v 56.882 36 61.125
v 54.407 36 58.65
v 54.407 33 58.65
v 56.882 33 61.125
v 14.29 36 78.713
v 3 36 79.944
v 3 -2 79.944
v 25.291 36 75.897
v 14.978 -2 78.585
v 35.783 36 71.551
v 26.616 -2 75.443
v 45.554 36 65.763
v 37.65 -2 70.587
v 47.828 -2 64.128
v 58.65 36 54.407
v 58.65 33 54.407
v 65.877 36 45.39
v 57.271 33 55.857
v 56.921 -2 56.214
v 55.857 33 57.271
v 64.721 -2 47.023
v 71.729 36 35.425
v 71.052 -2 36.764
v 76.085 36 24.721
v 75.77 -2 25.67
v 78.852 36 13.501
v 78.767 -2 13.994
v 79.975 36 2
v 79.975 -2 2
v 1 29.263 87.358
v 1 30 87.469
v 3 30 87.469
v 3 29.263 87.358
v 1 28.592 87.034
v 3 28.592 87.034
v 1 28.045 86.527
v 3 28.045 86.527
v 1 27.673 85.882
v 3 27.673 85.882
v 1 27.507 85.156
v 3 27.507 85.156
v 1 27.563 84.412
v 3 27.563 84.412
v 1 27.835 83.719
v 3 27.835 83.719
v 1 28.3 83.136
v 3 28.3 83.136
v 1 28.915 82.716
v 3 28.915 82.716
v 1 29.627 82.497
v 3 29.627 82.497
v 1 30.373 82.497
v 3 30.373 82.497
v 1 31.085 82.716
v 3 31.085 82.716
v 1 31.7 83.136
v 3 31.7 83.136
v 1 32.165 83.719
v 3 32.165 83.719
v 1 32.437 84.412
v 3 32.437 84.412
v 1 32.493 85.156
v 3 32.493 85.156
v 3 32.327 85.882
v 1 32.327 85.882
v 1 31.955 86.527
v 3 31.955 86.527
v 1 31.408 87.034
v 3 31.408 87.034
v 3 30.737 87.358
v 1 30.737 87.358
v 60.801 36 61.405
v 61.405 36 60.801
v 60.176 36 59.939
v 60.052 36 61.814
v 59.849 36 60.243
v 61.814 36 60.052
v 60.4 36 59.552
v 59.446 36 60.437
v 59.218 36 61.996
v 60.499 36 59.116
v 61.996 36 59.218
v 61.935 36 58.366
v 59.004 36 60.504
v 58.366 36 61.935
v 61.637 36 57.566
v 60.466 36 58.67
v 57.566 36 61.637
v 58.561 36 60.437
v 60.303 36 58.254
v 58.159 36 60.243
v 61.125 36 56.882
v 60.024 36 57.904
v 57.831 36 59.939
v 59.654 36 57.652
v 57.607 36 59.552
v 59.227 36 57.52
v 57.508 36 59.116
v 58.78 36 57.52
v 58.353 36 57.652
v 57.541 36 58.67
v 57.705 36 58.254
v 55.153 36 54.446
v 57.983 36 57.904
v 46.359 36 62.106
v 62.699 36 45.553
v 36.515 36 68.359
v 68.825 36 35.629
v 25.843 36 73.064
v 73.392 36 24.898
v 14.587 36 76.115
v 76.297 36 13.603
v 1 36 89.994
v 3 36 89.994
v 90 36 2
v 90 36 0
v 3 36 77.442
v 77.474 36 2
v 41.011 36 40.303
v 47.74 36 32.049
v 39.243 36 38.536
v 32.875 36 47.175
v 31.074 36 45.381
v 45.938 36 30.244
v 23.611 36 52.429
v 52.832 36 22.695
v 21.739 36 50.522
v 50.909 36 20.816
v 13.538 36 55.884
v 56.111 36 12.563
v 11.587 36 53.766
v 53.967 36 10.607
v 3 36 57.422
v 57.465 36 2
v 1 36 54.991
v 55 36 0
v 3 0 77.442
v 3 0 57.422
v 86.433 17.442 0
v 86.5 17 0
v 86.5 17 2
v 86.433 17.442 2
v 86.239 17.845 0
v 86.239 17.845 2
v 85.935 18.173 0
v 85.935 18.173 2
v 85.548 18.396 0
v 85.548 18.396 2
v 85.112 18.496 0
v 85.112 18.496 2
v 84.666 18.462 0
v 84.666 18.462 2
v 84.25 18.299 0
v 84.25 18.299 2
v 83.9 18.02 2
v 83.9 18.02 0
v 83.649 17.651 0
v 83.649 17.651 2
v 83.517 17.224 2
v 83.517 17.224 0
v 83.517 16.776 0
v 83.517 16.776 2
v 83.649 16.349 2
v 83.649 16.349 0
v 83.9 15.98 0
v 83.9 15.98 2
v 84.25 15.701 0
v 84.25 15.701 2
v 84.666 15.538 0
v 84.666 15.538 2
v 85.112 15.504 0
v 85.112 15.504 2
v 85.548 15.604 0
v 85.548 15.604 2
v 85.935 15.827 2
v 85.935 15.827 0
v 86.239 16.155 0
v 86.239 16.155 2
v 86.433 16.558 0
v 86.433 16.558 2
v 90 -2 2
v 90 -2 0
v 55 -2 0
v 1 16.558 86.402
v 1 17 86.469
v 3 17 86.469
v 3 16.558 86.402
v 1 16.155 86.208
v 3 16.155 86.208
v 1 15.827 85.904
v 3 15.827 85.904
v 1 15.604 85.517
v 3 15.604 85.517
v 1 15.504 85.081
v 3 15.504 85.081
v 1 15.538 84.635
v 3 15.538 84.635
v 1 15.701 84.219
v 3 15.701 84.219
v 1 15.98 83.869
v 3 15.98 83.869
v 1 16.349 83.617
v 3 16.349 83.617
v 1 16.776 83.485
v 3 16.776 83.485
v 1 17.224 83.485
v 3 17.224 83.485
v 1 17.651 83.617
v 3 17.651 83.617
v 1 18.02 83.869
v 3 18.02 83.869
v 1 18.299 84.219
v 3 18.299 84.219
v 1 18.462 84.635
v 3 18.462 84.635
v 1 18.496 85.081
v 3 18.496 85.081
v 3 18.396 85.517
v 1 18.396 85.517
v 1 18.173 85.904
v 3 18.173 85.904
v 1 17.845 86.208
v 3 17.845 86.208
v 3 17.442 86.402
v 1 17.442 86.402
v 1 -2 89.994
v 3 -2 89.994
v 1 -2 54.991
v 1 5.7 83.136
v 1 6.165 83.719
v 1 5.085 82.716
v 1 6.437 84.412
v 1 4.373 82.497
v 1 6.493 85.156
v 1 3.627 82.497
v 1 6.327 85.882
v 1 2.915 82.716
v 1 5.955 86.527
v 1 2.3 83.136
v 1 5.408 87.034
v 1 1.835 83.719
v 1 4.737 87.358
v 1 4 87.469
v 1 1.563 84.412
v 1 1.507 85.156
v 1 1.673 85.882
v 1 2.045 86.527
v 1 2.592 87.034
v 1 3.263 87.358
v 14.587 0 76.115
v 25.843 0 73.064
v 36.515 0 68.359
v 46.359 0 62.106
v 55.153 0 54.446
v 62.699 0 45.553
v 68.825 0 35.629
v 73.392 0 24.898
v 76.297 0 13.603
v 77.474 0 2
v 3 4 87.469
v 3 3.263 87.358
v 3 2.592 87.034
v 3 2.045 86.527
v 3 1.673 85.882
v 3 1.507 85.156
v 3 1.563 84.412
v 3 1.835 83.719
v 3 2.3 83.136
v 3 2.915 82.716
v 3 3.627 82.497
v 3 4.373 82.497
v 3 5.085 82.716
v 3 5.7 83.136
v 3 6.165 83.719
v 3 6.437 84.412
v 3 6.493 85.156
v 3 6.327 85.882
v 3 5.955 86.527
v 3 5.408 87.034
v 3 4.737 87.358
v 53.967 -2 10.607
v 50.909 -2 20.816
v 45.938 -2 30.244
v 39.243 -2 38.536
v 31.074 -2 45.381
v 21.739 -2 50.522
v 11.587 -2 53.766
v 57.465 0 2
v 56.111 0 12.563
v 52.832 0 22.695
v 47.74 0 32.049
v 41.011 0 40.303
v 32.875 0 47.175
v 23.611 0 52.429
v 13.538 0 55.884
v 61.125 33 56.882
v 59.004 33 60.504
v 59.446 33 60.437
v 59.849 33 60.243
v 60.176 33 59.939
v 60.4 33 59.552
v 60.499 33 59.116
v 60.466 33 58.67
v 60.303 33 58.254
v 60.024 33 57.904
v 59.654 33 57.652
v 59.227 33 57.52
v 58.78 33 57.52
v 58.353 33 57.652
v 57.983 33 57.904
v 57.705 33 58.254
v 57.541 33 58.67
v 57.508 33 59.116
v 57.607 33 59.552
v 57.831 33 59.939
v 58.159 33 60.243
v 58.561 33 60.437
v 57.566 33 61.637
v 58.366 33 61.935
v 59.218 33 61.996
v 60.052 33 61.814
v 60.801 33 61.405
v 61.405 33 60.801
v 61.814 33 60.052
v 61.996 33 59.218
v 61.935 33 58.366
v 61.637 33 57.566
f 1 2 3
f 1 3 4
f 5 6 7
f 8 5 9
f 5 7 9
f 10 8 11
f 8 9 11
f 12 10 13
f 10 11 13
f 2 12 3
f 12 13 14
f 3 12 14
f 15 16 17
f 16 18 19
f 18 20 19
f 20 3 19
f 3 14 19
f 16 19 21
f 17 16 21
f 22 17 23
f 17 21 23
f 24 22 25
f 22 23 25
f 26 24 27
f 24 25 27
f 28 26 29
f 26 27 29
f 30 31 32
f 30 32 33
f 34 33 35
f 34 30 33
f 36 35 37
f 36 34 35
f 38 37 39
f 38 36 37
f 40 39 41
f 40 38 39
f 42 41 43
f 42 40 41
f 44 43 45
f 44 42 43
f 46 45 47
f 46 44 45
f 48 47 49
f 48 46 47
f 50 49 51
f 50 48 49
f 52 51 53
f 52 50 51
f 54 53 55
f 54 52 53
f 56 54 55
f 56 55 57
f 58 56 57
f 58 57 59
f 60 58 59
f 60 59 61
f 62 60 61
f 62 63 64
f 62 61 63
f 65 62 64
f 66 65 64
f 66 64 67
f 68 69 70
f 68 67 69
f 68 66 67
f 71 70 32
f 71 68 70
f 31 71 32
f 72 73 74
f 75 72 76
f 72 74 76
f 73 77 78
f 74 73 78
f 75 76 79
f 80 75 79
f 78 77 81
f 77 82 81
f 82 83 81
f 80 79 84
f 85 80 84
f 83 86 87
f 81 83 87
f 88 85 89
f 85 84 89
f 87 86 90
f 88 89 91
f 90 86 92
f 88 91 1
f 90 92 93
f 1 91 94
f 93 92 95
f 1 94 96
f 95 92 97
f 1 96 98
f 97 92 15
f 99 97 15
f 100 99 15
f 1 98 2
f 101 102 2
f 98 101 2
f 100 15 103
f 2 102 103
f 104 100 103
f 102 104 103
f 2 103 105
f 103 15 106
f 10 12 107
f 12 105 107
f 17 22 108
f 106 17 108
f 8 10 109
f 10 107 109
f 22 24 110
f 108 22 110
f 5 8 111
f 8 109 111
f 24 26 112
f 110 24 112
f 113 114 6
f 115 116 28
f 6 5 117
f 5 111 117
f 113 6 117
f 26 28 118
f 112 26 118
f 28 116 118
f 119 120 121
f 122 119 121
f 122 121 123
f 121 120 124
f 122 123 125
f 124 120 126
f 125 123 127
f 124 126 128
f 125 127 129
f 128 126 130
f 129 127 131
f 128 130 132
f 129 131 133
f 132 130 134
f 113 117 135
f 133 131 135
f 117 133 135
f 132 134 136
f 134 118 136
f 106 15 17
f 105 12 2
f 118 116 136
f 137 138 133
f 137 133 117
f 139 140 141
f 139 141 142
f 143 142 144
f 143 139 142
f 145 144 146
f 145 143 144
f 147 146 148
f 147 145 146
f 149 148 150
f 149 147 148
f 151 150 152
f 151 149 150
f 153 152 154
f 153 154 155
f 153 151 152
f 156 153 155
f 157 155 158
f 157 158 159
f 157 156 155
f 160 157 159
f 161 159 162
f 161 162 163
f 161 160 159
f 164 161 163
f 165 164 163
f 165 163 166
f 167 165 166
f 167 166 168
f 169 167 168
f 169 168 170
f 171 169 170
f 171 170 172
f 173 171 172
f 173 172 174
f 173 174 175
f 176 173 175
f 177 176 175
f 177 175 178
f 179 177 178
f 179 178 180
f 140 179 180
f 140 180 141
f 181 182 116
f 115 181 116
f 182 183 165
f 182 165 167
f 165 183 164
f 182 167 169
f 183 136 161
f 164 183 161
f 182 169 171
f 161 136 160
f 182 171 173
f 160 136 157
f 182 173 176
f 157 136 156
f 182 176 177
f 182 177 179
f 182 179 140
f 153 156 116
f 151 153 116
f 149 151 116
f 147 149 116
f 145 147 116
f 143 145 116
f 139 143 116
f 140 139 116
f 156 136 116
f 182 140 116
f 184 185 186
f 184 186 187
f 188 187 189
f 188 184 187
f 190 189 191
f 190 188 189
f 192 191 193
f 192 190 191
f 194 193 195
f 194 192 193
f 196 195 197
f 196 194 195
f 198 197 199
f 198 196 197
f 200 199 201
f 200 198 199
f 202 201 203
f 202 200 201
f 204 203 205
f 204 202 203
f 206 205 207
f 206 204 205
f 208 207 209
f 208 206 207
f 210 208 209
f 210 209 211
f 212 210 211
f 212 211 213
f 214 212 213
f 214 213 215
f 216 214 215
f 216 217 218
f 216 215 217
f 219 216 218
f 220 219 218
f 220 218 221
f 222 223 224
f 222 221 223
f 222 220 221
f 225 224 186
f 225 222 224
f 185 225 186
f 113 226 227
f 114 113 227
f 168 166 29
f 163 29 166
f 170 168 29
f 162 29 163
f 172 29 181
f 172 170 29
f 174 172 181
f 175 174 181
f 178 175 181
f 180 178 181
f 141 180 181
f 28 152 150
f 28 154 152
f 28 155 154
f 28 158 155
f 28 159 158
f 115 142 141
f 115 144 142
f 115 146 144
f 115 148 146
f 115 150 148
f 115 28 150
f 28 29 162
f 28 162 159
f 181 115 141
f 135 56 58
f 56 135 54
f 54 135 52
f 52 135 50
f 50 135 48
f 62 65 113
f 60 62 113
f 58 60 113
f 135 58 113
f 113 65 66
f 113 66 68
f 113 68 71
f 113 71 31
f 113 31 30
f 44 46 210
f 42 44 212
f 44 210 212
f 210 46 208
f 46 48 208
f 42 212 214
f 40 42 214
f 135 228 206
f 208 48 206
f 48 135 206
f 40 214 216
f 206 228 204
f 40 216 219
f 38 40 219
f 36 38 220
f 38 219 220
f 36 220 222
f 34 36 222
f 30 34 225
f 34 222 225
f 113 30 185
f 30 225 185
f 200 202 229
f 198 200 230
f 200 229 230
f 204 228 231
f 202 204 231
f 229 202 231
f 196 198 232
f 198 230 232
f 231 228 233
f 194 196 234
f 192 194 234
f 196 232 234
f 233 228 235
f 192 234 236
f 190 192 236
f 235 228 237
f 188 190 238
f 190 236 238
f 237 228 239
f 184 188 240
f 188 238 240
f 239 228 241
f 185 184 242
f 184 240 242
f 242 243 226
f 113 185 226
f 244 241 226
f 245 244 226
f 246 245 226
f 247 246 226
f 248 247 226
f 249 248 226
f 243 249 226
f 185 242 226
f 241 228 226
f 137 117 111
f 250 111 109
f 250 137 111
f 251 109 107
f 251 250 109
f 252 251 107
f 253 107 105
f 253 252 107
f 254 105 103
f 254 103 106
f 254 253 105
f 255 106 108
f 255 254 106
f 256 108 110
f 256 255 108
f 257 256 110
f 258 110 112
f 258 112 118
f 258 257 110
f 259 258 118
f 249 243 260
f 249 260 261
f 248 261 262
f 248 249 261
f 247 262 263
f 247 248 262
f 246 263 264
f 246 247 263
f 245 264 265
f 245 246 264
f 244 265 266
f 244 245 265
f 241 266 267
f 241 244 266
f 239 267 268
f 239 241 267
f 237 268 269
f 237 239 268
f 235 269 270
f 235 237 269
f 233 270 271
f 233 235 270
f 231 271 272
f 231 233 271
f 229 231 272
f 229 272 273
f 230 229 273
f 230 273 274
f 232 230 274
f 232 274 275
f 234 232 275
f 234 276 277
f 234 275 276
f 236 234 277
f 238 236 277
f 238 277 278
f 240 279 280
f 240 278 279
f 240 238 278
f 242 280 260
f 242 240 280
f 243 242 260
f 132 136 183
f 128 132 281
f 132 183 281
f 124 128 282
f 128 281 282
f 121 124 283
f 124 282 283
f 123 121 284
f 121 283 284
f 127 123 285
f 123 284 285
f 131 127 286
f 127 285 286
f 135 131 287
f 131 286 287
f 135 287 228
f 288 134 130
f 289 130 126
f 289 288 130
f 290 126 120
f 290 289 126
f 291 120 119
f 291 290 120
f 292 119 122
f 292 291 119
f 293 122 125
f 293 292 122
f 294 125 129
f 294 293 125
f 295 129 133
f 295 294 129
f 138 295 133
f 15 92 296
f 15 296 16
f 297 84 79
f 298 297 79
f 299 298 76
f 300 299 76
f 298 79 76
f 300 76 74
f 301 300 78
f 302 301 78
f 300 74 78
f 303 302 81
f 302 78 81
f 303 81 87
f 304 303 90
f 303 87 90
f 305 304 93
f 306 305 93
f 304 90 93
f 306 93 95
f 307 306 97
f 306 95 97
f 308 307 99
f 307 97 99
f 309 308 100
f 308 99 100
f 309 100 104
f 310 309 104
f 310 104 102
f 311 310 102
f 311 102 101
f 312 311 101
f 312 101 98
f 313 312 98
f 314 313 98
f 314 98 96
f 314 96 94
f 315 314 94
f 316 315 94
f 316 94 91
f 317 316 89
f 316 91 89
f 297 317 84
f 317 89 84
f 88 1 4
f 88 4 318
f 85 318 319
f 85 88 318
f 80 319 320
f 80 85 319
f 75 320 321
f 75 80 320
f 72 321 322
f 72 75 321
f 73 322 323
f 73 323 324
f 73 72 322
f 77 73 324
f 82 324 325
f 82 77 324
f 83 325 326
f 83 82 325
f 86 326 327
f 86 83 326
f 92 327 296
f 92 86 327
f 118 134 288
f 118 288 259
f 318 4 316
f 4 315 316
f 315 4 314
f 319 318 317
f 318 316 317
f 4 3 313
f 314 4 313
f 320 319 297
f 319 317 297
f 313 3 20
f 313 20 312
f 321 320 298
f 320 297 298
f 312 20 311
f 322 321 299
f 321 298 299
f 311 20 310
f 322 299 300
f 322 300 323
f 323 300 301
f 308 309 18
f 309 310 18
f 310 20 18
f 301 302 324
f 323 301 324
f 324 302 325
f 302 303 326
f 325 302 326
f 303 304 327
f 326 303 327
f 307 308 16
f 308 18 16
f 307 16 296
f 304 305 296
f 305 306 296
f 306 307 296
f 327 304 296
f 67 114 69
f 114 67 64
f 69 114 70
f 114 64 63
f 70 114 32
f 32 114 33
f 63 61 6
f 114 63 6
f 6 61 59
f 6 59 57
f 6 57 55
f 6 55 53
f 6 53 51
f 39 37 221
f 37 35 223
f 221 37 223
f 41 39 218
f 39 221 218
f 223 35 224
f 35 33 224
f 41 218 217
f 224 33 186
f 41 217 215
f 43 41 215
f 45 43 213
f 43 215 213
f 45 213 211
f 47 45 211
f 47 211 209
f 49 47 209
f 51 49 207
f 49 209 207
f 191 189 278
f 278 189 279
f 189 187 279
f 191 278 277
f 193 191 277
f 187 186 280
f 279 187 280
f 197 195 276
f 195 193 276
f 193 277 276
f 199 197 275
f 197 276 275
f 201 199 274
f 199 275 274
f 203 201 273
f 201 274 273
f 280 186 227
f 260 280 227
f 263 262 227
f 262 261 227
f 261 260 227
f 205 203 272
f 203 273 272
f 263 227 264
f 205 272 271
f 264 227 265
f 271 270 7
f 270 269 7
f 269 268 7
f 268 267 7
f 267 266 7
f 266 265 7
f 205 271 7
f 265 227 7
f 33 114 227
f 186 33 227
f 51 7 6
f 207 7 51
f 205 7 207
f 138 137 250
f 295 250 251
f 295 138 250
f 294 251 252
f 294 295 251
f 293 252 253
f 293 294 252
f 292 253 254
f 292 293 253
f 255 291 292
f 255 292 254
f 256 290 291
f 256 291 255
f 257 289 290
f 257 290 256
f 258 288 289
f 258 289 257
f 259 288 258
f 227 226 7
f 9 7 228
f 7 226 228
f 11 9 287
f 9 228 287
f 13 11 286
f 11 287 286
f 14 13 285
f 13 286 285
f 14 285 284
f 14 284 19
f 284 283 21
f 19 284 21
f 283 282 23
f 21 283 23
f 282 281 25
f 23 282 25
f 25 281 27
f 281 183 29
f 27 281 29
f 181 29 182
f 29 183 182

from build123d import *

# Parameters (mm, degrees)
EXTRUDE_1_DEPTH      = 36
EXTRUDE_START        = -2
EXTRUDE_2_DEPTH      = 2
SKETCH_3_R           = 2.5
SKETCH_3_R_2         = 1.5
CUT_EXTRUDE_1_DEPTH  = 126.677663072
EXTRUDE_3_DEPTH      = 2
EXTRUDE_3_DEPTH_BACK = 2
SKETCH_4_R           = 1.5
SKETCH_5_W           = 98.68516208
SKETCH_5_H           = 47.907231557
CUT_EXTRUDE_2_DEPTH  = 133.268193437
SKETCH_6_R           = 1.5
EXTRUDE_4_DEPTH      = 3


with BuildPart() as part:
    # 草图1 → 凸台-拉伸1 (new body)
    with BuildSketch(Plane(origin=(0, 0, 0), x_dir=(1, 0, 0), z_dir=(0, 1, 0))):
        with BuildLine():
            Line((3, -79.943730211), (3, -89.993749756))
            Line((3, -89.993749756), (1, -89.993749756))
            Line((1, -89.993749756), (1, -54.990908339))
            ThreePointArc((1, -54.990908339), (55, 0), (1, 54.990908339))
            Line((1, 54.990908339), (1, 79.993749756))
            Line((1, 79.993749756), (1, 89.993749756))
            Line((1, 89.993749756), (3, 89.993749756))
            Line((3, 89.993749756), (3, 79.943730211))
            ThreePointArc((3, 79.943730211), (80, 0), (3, -79.943730211))
        make_face()
        with BuildLine():
            Line((3, 77.441913716), (3, 57.421685799))
            ThreePointArc((3, 57.421685799), (57.5, 0), (3, -57.421685799))
            Line((3, -57.421685799), (3, -77.441913716))
            ThreePointArc((3, -77.441913716), (77.5, 0), (3, 77.441913716))
        make_face(mode=Mode.SUBTRACT)
    extrude(amount=EXTRUDE_1_DEPTH)

    # 草图2 → 凸台-拉伸2 (add)
    with BuildSketch(Plane(origin=(0, 0, 0), x_dir=(1, 0, 0), z_dir=(0, 1, 0)).offset(EXTRUDE_START)):
        with BuildLine():
            Line((1, 89.993749756), (1, 54.990908339))
            ThreePointArc((1, 54.990908339), (55, 0), (1, -54.990908339))
            Line((1, -54.990908339), (1, -89.993749756))
            Line((1, -89.993749756), (3, -89.993749756))
            Line((3, -89.993749756), (3, -79.943730211))
            ThreePointArc((3, -79.943730211), (80, 0), (3, 79.943730211))
            Line((3, 79.943730211), (3, 89.993749756))
            Line((3, 89.993749756), (1, 89.993749756))
        make_face()
    extrude(amount=EXTRUDE_2_DEPTH)

    # 草图3 → 切除-拉伸1 (cut, through all)
    with BuildSketch(Plane(origin=(0, 0, 0), x_dir=(0, 0, -1), z_dir=(1, 0, 0))):
        with Locations((-84.968739983, 30)):
            Circle(SKETCH_3_R)
        with Locations((-84.968739983, 17)):
            Circle(SKETCH_3_R_2)
        with Locations((84.968739983, 17)):
            Circle(SKETCH_3_R_2)
        with Locations((84.968739983, 30)):
            Circle(SKETCH_3_R)
        with Locations((-84.968739983, 4)):
            Circle(SKETCH_3_R)
    extrude(amount=CUT_EXTRUDE_1_DEPTH, mode=Mode.SUBTRACT)

    # 草图4 → 凸台-拉伸3 (add, two sides: drawn at the far end of the back side and taken through both)
    with BuildSketch(Plane.XY.offset(-EXTRUDE_3_DEPTH_BACK)):
        Polygon((80, 36), (55, 36), (55, -2), (80, -2), (90, -2), (90, 36), align=None)
        with Locations((85, 17)):
            Circle(SKETCH_4_R, mode=Mode.SUBTRACT)
    extrude(amount=EXTRUDE_3_DEPTH + EXTRUDE_3_DEPTH_BACK)

    # 草图5 → 切除-拉伸2 (cut, through all)
    with BuildSketch(Plane.XY):
        with Locations((47.157910723, 20.571893337)):
            Rectangle(SKETCH_5_W, SKETCH_5_H)
    extrude(amount=-CUT_EXTRUDE_2_DEPTH, mode=Mode.SUBTRACT)

    # 草图6 → 凸台-拉伸4 (add)
    with BuildSketch(Plane(origin=(0, 36, 0), x_dir=(1, 0, 0), z_dir=(0, 1, 0))):
        with BuildLine():
            Line((58.650074089, -54.407433402), (54.407433402, -58.650074089))
            Line((54.407433402, -58.650074089), (56.882307136, -61.124947823))
            ThreePointArc((56.882307136, -61.124947823), (61.124947823, -61.124947823), (61.124947823, -56.882307136))
            Line((61.124947823, -56.882307136), (58.650074089, -54.407433402))
        make_face()
        with Locations((59.003627479, -59.003627479)):
            Circle(SKETCH_6_R, mode=Mode.SUBTRACT)
    extrude(amount=-EXTRUDE_4_DEPTH)


solid = part.part
